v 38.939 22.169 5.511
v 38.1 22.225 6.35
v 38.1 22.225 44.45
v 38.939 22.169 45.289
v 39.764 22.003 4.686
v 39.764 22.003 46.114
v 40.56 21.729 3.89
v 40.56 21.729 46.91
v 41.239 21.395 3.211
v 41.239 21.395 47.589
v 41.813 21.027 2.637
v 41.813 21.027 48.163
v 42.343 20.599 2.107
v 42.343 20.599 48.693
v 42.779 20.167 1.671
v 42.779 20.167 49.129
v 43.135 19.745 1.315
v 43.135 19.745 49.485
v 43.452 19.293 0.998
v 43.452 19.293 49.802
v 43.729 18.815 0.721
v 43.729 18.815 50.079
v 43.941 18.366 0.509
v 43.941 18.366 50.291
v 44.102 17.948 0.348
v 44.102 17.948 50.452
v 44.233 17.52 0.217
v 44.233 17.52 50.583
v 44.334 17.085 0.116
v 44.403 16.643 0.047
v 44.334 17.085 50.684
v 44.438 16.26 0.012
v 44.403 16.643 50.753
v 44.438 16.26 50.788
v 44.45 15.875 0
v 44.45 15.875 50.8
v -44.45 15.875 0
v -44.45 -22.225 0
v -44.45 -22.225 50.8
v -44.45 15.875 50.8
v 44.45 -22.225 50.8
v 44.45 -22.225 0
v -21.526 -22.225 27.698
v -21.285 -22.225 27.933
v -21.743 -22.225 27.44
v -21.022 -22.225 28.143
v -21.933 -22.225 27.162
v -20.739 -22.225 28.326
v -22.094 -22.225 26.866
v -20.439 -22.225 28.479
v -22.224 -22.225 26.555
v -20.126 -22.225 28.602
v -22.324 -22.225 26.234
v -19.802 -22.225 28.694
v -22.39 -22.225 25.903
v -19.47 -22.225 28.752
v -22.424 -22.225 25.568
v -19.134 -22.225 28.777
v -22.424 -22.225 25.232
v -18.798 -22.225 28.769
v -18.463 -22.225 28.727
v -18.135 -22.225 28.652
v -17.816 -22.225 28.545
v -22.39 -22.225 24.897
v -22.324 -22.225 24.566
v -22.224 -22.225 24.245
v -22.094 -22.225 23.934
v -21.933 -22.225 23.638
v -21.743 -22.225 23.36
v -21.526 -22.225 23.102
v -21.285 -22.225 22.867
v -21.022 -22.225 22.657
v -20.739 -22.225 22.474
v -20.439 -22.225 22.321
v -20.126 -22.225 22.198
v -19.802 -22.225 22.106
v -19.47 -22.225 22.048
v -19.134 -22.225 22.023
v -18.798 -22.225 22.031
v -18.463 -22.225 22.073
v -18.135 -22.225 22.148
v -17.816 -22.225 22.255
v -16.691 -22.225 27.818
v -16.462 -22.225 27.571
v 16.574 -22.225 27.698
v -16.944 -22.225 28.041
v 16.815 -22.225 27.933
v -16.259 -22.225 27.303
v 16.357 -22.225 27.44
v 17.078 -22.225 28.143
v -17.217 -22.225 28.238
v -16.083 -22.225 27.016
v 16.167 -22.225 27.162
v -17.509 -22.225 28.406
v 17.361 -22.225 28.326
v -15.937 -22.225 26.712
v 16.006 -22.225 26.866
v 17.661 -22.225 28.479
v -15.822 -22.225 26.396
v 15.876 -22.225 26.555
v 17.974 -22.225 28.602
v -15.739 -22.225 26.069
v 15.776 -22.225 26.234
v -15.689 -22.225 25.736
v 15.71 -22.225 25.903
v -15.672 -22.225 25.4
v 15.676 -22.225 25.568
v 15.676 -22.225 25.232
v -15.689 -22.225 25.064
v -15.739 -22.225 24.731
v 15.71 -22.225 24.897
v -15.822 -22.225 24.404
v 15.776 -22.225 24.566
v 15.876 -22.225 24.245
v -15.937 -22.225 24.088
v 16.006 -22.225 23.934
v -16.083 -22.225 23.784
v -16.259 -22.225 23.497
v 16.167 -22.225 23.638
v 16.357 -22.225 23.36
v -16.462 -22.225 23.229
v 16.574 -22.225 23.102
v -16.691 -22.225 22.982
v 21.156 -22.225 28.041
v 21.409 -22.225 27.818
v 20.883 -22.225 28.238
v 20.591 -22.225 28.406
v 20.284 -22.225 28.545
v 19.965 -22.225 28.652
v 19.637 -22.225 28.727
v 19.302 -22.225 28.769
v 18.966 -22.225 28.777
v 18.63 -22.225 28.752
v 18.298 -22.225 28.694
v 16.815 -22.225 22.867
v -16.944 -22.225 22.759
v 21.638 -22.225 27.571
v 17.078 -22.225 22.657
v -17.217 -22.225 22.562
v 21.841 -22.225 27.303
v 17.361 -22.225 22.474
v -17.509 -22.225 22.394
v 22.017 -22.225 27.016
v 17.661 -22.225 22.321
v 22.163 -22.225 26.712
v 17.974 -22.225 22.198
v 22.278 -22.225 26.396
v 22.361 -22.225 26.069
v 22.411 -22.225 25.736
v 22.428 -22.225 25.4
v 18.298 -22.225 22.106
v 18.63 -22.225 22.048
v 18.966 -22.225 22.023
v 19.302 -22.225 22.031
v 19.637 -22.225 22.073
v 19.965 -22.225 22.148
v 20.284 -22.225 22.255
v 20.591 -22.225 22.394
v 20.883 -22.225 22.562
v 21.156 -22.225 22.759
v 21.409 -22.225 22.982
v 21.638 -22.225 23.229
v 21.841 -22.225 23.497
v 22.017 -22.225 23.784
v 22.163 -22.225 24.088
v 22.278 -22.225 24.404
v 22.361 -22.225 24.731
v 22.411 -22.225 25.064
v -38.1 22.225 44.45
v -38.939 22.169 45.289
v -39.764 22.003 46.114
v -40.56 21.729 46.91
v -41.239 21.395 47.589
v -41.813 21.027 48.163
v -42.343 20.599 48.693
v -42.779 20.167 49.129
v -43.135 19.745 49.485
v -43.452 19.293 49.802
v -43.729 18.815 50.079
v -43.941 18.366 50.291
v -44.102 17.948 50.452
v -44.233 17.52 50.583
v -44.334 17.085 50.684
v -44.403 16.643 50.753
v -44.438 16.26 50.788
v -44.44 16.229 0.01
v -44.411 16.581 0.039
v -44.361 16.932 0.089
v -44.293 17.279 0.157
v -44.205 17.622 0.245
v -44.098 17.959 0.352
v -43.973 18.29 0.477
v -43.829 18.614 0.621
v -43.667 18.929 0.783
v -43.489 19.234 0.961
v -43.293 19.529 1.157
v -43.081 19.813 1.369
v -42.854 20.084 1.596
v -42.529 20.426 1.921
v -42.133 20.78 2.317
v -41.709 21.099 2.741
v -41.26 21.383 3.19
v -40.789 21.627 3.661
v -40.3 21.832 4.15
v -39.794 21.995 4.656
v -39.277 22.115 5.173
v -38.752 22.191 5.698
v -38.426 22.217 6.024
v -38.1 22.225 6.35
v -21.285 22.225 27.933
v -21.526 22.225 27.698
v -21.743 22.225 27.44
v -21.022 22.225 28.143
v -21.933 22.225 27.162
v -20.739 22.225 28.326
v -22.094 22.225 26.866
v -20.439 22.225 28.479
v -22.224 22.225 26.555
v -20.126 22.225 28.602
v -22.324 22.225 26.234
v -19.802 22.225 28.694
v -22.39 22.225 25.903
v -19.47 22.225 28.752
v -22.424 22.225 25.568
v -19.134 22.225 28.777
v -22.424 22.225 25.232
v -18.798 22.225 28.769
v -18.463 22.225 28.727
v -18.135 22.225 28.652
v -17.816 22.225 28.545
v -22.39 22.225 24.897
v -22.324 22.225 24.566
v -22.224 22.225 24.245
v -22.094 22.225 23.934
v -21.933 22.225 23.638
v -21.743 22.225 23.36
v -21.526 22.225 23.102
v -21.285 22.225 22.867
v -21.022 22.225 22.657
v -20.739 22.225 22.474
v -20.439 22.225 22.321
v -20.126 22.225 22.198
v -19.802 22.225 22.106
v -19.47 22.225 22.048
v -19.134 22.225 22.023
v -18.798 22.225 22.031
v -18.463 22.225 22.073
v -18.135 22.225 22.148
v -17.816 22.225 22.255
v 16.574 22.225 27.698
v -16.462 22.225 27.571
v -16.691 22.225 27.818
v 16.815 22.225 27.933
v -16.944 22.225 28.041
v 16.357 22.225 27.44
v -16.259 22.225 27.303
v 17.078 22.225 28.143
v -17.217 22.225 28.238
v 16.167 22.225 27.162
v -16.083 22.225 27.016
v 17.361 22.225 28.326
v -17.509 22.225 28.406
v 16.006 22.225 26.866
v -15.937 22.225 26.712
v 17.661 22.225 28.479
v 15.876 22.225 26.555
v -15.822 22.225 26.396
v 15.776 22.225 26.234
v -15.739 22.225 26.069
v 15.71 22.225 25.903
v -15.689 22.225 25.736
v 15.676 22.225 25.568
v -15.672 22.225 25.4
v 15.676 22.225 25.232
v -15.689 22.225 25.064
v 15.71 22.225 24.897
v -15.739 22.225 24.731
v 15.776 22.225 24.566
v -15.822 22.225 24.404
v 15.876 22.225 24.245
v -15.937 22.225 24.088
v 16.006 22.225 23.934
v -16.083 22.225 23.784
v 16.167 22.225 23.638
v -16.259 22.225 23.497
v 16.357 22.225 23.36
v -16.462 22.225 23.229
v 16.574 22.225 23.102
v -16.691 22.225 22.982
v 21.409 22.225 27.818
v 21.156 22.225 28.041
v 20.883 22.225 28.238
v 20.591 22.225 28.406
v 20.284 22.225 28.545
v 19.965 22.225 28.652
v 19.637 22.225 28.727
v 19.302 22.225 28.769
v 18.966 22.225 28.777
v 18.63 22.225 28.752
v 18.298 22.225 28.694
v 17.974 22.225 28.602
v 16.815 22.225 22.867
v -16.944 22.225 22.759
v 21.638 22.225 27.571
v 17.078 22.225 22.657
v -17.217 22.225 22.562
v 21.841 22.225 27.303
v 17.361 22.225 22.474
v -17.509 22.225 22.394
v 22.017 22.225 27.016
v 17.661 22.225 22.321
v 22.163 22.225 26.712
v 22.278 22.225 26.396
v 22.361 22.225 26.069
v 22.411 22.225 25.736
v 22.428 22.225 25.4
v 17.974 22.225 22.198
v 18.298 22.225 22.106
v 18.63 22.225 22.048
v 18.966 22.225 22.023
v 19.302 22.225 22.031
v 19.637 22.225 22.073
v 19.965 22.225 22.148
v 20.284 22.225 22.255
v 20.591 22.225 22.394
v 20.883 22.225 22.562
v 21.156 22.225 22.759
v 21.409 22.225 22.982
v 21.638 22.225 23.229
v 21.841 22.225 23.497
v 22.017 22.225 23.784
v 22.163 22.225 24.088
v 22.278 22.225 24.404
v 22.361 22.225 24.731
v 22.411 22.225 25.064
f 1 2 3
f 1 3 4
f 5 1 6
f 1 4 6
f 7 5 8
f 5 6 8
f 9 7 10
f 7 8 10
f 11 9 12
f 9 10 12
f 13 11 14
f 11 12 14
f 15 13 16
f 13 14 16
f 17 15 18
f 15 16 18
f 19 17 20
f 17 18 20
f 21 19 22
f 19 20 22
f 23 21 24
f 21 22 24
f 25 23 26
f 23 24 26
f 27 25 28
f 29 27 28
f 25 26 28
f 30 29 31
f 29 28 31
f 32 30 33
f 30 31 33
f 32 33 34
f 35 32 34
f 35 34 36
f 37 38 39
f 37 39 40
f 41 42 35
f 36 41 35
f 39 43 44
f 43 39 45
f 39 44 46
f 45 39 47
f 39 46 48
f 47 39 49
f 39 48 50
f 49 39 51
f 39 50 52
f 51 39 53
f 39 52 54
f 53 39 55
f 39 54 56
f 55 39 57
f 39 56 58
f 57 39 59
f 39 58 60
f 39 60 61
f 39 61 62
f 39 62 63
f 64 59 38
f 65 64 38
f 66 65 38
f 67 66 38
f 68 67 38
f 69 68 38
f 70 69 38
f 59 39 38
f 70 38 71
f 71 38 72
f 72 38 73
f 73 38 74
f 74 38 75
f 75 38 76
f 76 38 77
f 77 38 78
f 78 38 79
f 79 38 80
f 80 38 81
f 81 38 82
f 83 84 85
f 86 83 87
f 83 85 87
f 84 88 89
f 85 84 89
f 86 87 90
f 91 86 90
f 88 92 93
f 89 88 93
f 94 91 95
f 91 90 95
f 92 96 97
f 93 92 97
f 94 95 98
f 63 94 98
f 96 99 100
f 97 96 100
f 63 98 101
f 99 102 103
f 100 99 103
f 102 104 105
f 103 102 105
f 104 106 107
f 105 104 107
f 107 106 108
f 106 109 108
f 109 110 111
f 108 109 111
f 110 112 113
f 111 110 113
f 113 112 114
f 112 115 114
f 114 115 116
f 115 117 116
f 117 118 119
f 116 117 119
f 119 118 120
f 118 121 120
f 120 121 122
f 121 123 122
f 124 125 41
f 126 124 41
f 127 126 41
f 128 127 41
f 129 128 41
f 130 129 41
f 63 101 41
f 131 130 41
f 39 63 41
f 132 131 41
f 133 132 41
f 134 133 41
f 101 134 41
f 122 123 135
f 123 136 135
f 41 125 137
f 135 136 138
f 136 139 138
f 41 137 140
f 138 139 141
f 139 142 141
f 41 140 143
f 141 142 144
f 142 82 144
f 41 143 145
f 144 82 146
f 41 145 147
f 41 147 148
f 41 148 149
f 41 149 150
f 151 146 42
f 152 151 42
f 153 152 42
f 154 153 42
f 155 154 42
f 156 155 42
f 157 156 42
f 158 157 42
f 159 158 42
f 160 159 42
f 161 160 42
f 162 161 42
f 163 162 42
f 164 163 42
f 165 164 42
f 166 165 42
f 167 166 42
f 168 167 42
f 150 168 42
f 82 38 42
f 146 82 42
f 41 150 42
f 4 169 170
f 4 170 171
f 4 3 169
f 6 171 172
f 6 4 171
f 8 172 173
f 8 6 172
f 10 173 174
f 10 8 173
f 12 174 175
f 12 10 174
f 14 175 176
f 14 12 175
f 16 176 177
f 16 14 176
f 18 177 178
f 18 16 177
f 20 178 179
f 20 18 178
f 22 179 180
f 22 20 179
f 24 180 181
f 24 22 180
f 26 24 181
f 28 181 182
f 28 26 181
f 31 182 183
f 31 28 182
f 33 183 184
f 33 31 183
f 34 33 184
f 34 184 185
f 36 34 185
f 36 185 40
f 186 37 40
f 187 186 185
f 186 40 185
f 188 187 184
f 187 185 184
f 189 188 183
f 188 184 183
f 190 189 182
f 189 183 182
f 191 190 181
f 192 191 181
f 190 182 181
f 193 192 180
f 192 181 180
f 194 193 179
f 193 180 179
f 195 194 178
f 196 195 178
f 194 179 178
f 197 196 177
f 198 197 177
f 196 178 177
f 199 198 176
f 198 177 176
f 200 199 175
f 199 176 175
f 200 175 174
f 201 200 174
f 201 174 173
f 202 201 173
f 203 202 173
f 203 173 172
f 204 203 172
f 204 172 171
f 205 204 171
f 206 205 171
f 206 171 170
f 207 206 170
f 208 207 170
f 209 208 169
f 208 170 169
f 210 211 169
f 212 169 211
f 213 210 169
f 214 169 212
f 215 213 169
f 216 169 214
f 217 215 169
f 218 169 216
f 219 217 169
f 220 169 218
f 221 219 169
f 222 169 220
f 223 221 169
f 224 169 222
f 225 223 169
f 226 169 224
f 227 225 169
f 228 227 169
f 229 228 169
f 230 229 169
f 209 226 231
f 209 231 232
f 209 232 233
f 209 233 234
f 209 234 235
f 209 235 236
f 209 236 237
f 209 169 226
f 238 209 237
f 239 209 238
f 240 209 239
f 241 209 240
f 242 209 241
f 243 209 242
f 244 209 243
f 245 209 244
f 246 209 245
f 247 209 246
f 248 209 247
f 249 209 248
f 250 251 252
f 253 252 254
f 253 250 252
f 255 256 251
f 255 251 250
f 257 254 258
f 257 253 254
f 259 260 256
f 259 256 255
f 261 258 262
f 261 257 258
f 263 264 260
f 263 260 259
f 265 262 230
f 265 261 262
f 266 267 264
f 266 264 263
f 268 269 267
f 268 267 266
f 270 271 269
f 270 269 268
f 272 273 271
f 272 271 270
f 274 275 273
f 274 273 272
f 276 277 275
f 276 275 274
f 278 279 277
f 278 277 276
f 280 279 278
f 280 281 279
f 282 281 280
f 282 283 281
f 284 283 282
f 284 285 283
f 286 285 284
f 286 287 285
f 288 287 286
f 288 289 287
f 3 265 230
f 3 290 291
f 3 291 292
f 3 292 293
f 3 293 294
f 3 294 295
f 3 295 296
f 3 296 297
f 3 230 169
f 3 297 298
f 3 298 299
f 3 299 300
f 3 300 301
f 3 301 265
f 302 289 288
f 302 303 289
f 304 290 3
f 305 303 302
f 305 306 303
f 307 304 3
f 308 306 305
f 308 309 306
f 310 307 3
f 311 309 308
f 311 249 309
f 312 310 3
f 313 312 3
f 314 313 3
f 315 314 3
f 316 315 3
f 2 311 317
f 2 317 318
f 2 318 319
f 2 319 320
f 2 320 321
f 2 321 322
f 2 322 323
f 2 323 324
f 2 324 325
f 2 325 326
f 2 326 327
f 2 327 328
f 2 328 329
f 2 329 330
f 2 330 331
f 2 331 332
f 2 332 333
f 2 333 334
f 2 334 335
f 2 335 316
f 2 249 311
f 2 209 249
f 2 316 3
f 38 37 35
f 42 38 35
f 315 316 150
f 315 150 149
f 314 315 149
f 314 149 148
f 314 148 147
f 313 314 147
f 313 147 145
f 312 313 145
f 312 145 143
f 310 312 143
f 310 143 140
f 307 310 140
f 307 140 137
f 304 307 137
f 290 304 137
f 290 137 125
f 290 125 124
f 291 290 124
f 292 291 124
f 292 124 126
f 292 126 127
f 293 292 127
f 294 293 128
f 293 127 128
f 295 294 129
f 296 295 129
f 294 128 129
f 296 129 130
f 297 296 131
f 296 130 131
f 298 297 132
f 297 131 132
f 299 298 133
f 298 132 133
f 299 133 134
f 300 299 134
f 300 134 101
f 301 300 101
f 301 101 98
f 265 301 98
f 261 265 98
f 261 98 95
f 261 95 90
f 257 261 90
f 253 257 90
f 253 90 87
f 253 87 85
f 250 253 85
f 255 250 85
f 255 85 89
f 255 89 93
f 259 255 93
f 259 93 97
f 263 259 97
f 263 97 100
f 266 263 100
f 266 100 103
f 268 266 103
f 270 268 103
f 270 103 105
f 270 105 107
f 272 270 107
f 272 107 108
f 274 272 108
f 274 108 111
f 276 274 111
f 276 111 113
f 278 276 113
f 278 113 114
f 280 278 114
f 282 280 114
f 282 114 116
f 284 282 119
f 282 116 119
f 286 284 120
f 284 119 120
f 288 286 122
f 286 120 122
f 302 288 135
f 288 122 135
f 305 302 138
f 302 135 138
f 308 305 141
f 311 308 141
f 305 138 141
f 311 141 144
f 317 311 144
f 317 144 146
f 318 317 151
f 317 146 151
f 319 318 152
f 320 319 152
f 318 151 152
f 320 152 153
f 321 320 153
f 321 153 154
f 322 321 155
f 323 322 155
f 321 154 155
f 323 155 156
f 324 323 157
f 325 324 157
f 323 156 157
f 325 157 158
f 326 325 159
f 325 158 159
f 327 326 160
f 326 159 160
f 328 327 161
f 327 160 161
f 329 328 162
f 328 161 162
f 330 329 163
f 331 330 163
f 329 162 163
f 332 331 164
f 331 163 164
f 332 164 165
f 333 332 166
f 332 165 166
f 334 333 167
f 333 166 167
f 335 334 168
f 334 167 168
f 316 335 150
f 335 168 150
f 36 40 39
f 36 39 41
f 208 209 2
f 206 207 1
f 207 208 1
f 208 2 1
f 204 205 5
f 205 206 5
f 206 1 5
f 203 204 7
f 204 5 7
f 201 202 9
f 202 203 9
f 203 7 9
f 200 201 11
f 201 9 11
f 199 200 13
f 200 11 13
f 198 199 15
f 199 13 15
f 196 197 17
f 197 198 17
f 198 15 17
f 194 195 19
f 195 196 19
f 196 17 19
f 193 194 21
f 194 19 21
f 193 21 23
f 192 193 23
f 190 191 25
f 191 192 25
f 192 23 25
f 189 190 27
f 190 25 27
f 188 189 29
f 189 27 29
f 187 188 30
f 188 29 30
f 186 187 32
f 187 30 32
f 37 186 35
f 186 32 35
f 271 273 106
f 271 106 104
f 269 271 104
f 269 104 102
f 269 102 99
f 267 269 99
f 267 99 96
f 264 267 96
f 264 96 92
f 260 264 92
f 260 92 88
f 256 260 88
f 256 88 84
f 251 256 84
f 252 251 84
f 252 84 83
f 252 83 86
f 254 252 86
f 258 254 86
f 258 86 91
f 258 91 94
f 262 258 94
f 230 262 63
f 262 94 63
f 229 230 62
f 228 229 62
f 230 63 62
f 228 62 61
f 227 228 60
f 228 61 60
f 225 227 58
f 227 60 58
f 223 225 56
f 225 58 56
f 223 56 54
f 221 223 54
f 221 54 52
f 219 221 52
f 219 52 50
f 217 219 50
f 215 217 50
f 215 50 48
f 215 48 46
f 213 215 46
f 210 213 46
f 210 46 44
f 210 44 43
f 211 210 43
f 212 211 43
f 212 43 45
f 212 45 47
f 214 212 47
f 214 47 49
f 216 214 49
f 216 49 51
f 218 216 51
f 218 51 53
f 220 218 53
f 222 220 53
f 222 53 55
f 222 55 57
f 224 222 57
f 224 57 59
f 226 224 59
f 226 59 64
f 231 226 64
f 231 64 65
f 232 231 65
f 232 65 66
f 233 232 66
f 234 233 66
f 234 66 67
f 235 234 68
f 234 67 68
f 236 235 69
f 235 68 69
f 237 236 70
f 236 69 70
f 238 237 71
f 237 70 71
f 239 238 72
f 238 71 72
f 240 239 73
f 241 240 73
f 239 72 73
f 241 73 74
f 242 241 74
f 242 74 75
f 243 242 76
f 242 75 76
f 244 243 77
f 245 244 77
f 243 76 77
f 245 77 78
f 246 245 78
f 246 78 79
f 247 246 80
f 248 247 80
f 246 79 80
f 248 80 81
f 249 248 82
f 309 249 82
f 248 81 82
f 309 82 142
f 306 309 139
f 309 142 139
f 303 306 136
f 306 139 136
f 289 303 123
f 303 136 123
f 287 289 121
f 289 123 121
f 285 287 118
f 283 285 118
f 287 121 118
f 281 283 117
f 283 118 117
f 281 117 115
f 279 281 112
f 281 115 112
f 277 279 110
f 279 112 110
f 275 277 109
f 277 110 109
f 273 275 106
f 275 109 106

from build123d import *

# Parameters (mm, degrees)
F0_W     = 88.9
F0_H     = 44.45
F1_DEPTH = 50.8
F3_D     = 6.7564
F4_R     = 6.35


with BuildPart() as f1:
    # F0 (on Top) → F1 (new body)
    with BuildSketch(Plane.XY):
        Rectangle(F0_W, F0_H)
    extrude(amount=F1_DEPTH)

    # F3 (through all)
    with Locations(Plane(origin=(0, 22.225, 0), x_dir=(-1, 0, 0), z_dir=(0, 1, 0))):
        with Locations((-19.05, 25.4), (19.05, 25.4)):
            Hole(F3_D / 2)

    # F4
    f4_edges = [f1.edges().sort_by_distance(p)[0] for p in [
        (0, 22.225, 50.8),
        (-44.45, 22.225, 25.4),
        (0, 22.225, 0),
        (44.45, 22.225, 25.4),
    ]]
    fillet(f4_edges, radius=F4_R)


solid = f1.part
